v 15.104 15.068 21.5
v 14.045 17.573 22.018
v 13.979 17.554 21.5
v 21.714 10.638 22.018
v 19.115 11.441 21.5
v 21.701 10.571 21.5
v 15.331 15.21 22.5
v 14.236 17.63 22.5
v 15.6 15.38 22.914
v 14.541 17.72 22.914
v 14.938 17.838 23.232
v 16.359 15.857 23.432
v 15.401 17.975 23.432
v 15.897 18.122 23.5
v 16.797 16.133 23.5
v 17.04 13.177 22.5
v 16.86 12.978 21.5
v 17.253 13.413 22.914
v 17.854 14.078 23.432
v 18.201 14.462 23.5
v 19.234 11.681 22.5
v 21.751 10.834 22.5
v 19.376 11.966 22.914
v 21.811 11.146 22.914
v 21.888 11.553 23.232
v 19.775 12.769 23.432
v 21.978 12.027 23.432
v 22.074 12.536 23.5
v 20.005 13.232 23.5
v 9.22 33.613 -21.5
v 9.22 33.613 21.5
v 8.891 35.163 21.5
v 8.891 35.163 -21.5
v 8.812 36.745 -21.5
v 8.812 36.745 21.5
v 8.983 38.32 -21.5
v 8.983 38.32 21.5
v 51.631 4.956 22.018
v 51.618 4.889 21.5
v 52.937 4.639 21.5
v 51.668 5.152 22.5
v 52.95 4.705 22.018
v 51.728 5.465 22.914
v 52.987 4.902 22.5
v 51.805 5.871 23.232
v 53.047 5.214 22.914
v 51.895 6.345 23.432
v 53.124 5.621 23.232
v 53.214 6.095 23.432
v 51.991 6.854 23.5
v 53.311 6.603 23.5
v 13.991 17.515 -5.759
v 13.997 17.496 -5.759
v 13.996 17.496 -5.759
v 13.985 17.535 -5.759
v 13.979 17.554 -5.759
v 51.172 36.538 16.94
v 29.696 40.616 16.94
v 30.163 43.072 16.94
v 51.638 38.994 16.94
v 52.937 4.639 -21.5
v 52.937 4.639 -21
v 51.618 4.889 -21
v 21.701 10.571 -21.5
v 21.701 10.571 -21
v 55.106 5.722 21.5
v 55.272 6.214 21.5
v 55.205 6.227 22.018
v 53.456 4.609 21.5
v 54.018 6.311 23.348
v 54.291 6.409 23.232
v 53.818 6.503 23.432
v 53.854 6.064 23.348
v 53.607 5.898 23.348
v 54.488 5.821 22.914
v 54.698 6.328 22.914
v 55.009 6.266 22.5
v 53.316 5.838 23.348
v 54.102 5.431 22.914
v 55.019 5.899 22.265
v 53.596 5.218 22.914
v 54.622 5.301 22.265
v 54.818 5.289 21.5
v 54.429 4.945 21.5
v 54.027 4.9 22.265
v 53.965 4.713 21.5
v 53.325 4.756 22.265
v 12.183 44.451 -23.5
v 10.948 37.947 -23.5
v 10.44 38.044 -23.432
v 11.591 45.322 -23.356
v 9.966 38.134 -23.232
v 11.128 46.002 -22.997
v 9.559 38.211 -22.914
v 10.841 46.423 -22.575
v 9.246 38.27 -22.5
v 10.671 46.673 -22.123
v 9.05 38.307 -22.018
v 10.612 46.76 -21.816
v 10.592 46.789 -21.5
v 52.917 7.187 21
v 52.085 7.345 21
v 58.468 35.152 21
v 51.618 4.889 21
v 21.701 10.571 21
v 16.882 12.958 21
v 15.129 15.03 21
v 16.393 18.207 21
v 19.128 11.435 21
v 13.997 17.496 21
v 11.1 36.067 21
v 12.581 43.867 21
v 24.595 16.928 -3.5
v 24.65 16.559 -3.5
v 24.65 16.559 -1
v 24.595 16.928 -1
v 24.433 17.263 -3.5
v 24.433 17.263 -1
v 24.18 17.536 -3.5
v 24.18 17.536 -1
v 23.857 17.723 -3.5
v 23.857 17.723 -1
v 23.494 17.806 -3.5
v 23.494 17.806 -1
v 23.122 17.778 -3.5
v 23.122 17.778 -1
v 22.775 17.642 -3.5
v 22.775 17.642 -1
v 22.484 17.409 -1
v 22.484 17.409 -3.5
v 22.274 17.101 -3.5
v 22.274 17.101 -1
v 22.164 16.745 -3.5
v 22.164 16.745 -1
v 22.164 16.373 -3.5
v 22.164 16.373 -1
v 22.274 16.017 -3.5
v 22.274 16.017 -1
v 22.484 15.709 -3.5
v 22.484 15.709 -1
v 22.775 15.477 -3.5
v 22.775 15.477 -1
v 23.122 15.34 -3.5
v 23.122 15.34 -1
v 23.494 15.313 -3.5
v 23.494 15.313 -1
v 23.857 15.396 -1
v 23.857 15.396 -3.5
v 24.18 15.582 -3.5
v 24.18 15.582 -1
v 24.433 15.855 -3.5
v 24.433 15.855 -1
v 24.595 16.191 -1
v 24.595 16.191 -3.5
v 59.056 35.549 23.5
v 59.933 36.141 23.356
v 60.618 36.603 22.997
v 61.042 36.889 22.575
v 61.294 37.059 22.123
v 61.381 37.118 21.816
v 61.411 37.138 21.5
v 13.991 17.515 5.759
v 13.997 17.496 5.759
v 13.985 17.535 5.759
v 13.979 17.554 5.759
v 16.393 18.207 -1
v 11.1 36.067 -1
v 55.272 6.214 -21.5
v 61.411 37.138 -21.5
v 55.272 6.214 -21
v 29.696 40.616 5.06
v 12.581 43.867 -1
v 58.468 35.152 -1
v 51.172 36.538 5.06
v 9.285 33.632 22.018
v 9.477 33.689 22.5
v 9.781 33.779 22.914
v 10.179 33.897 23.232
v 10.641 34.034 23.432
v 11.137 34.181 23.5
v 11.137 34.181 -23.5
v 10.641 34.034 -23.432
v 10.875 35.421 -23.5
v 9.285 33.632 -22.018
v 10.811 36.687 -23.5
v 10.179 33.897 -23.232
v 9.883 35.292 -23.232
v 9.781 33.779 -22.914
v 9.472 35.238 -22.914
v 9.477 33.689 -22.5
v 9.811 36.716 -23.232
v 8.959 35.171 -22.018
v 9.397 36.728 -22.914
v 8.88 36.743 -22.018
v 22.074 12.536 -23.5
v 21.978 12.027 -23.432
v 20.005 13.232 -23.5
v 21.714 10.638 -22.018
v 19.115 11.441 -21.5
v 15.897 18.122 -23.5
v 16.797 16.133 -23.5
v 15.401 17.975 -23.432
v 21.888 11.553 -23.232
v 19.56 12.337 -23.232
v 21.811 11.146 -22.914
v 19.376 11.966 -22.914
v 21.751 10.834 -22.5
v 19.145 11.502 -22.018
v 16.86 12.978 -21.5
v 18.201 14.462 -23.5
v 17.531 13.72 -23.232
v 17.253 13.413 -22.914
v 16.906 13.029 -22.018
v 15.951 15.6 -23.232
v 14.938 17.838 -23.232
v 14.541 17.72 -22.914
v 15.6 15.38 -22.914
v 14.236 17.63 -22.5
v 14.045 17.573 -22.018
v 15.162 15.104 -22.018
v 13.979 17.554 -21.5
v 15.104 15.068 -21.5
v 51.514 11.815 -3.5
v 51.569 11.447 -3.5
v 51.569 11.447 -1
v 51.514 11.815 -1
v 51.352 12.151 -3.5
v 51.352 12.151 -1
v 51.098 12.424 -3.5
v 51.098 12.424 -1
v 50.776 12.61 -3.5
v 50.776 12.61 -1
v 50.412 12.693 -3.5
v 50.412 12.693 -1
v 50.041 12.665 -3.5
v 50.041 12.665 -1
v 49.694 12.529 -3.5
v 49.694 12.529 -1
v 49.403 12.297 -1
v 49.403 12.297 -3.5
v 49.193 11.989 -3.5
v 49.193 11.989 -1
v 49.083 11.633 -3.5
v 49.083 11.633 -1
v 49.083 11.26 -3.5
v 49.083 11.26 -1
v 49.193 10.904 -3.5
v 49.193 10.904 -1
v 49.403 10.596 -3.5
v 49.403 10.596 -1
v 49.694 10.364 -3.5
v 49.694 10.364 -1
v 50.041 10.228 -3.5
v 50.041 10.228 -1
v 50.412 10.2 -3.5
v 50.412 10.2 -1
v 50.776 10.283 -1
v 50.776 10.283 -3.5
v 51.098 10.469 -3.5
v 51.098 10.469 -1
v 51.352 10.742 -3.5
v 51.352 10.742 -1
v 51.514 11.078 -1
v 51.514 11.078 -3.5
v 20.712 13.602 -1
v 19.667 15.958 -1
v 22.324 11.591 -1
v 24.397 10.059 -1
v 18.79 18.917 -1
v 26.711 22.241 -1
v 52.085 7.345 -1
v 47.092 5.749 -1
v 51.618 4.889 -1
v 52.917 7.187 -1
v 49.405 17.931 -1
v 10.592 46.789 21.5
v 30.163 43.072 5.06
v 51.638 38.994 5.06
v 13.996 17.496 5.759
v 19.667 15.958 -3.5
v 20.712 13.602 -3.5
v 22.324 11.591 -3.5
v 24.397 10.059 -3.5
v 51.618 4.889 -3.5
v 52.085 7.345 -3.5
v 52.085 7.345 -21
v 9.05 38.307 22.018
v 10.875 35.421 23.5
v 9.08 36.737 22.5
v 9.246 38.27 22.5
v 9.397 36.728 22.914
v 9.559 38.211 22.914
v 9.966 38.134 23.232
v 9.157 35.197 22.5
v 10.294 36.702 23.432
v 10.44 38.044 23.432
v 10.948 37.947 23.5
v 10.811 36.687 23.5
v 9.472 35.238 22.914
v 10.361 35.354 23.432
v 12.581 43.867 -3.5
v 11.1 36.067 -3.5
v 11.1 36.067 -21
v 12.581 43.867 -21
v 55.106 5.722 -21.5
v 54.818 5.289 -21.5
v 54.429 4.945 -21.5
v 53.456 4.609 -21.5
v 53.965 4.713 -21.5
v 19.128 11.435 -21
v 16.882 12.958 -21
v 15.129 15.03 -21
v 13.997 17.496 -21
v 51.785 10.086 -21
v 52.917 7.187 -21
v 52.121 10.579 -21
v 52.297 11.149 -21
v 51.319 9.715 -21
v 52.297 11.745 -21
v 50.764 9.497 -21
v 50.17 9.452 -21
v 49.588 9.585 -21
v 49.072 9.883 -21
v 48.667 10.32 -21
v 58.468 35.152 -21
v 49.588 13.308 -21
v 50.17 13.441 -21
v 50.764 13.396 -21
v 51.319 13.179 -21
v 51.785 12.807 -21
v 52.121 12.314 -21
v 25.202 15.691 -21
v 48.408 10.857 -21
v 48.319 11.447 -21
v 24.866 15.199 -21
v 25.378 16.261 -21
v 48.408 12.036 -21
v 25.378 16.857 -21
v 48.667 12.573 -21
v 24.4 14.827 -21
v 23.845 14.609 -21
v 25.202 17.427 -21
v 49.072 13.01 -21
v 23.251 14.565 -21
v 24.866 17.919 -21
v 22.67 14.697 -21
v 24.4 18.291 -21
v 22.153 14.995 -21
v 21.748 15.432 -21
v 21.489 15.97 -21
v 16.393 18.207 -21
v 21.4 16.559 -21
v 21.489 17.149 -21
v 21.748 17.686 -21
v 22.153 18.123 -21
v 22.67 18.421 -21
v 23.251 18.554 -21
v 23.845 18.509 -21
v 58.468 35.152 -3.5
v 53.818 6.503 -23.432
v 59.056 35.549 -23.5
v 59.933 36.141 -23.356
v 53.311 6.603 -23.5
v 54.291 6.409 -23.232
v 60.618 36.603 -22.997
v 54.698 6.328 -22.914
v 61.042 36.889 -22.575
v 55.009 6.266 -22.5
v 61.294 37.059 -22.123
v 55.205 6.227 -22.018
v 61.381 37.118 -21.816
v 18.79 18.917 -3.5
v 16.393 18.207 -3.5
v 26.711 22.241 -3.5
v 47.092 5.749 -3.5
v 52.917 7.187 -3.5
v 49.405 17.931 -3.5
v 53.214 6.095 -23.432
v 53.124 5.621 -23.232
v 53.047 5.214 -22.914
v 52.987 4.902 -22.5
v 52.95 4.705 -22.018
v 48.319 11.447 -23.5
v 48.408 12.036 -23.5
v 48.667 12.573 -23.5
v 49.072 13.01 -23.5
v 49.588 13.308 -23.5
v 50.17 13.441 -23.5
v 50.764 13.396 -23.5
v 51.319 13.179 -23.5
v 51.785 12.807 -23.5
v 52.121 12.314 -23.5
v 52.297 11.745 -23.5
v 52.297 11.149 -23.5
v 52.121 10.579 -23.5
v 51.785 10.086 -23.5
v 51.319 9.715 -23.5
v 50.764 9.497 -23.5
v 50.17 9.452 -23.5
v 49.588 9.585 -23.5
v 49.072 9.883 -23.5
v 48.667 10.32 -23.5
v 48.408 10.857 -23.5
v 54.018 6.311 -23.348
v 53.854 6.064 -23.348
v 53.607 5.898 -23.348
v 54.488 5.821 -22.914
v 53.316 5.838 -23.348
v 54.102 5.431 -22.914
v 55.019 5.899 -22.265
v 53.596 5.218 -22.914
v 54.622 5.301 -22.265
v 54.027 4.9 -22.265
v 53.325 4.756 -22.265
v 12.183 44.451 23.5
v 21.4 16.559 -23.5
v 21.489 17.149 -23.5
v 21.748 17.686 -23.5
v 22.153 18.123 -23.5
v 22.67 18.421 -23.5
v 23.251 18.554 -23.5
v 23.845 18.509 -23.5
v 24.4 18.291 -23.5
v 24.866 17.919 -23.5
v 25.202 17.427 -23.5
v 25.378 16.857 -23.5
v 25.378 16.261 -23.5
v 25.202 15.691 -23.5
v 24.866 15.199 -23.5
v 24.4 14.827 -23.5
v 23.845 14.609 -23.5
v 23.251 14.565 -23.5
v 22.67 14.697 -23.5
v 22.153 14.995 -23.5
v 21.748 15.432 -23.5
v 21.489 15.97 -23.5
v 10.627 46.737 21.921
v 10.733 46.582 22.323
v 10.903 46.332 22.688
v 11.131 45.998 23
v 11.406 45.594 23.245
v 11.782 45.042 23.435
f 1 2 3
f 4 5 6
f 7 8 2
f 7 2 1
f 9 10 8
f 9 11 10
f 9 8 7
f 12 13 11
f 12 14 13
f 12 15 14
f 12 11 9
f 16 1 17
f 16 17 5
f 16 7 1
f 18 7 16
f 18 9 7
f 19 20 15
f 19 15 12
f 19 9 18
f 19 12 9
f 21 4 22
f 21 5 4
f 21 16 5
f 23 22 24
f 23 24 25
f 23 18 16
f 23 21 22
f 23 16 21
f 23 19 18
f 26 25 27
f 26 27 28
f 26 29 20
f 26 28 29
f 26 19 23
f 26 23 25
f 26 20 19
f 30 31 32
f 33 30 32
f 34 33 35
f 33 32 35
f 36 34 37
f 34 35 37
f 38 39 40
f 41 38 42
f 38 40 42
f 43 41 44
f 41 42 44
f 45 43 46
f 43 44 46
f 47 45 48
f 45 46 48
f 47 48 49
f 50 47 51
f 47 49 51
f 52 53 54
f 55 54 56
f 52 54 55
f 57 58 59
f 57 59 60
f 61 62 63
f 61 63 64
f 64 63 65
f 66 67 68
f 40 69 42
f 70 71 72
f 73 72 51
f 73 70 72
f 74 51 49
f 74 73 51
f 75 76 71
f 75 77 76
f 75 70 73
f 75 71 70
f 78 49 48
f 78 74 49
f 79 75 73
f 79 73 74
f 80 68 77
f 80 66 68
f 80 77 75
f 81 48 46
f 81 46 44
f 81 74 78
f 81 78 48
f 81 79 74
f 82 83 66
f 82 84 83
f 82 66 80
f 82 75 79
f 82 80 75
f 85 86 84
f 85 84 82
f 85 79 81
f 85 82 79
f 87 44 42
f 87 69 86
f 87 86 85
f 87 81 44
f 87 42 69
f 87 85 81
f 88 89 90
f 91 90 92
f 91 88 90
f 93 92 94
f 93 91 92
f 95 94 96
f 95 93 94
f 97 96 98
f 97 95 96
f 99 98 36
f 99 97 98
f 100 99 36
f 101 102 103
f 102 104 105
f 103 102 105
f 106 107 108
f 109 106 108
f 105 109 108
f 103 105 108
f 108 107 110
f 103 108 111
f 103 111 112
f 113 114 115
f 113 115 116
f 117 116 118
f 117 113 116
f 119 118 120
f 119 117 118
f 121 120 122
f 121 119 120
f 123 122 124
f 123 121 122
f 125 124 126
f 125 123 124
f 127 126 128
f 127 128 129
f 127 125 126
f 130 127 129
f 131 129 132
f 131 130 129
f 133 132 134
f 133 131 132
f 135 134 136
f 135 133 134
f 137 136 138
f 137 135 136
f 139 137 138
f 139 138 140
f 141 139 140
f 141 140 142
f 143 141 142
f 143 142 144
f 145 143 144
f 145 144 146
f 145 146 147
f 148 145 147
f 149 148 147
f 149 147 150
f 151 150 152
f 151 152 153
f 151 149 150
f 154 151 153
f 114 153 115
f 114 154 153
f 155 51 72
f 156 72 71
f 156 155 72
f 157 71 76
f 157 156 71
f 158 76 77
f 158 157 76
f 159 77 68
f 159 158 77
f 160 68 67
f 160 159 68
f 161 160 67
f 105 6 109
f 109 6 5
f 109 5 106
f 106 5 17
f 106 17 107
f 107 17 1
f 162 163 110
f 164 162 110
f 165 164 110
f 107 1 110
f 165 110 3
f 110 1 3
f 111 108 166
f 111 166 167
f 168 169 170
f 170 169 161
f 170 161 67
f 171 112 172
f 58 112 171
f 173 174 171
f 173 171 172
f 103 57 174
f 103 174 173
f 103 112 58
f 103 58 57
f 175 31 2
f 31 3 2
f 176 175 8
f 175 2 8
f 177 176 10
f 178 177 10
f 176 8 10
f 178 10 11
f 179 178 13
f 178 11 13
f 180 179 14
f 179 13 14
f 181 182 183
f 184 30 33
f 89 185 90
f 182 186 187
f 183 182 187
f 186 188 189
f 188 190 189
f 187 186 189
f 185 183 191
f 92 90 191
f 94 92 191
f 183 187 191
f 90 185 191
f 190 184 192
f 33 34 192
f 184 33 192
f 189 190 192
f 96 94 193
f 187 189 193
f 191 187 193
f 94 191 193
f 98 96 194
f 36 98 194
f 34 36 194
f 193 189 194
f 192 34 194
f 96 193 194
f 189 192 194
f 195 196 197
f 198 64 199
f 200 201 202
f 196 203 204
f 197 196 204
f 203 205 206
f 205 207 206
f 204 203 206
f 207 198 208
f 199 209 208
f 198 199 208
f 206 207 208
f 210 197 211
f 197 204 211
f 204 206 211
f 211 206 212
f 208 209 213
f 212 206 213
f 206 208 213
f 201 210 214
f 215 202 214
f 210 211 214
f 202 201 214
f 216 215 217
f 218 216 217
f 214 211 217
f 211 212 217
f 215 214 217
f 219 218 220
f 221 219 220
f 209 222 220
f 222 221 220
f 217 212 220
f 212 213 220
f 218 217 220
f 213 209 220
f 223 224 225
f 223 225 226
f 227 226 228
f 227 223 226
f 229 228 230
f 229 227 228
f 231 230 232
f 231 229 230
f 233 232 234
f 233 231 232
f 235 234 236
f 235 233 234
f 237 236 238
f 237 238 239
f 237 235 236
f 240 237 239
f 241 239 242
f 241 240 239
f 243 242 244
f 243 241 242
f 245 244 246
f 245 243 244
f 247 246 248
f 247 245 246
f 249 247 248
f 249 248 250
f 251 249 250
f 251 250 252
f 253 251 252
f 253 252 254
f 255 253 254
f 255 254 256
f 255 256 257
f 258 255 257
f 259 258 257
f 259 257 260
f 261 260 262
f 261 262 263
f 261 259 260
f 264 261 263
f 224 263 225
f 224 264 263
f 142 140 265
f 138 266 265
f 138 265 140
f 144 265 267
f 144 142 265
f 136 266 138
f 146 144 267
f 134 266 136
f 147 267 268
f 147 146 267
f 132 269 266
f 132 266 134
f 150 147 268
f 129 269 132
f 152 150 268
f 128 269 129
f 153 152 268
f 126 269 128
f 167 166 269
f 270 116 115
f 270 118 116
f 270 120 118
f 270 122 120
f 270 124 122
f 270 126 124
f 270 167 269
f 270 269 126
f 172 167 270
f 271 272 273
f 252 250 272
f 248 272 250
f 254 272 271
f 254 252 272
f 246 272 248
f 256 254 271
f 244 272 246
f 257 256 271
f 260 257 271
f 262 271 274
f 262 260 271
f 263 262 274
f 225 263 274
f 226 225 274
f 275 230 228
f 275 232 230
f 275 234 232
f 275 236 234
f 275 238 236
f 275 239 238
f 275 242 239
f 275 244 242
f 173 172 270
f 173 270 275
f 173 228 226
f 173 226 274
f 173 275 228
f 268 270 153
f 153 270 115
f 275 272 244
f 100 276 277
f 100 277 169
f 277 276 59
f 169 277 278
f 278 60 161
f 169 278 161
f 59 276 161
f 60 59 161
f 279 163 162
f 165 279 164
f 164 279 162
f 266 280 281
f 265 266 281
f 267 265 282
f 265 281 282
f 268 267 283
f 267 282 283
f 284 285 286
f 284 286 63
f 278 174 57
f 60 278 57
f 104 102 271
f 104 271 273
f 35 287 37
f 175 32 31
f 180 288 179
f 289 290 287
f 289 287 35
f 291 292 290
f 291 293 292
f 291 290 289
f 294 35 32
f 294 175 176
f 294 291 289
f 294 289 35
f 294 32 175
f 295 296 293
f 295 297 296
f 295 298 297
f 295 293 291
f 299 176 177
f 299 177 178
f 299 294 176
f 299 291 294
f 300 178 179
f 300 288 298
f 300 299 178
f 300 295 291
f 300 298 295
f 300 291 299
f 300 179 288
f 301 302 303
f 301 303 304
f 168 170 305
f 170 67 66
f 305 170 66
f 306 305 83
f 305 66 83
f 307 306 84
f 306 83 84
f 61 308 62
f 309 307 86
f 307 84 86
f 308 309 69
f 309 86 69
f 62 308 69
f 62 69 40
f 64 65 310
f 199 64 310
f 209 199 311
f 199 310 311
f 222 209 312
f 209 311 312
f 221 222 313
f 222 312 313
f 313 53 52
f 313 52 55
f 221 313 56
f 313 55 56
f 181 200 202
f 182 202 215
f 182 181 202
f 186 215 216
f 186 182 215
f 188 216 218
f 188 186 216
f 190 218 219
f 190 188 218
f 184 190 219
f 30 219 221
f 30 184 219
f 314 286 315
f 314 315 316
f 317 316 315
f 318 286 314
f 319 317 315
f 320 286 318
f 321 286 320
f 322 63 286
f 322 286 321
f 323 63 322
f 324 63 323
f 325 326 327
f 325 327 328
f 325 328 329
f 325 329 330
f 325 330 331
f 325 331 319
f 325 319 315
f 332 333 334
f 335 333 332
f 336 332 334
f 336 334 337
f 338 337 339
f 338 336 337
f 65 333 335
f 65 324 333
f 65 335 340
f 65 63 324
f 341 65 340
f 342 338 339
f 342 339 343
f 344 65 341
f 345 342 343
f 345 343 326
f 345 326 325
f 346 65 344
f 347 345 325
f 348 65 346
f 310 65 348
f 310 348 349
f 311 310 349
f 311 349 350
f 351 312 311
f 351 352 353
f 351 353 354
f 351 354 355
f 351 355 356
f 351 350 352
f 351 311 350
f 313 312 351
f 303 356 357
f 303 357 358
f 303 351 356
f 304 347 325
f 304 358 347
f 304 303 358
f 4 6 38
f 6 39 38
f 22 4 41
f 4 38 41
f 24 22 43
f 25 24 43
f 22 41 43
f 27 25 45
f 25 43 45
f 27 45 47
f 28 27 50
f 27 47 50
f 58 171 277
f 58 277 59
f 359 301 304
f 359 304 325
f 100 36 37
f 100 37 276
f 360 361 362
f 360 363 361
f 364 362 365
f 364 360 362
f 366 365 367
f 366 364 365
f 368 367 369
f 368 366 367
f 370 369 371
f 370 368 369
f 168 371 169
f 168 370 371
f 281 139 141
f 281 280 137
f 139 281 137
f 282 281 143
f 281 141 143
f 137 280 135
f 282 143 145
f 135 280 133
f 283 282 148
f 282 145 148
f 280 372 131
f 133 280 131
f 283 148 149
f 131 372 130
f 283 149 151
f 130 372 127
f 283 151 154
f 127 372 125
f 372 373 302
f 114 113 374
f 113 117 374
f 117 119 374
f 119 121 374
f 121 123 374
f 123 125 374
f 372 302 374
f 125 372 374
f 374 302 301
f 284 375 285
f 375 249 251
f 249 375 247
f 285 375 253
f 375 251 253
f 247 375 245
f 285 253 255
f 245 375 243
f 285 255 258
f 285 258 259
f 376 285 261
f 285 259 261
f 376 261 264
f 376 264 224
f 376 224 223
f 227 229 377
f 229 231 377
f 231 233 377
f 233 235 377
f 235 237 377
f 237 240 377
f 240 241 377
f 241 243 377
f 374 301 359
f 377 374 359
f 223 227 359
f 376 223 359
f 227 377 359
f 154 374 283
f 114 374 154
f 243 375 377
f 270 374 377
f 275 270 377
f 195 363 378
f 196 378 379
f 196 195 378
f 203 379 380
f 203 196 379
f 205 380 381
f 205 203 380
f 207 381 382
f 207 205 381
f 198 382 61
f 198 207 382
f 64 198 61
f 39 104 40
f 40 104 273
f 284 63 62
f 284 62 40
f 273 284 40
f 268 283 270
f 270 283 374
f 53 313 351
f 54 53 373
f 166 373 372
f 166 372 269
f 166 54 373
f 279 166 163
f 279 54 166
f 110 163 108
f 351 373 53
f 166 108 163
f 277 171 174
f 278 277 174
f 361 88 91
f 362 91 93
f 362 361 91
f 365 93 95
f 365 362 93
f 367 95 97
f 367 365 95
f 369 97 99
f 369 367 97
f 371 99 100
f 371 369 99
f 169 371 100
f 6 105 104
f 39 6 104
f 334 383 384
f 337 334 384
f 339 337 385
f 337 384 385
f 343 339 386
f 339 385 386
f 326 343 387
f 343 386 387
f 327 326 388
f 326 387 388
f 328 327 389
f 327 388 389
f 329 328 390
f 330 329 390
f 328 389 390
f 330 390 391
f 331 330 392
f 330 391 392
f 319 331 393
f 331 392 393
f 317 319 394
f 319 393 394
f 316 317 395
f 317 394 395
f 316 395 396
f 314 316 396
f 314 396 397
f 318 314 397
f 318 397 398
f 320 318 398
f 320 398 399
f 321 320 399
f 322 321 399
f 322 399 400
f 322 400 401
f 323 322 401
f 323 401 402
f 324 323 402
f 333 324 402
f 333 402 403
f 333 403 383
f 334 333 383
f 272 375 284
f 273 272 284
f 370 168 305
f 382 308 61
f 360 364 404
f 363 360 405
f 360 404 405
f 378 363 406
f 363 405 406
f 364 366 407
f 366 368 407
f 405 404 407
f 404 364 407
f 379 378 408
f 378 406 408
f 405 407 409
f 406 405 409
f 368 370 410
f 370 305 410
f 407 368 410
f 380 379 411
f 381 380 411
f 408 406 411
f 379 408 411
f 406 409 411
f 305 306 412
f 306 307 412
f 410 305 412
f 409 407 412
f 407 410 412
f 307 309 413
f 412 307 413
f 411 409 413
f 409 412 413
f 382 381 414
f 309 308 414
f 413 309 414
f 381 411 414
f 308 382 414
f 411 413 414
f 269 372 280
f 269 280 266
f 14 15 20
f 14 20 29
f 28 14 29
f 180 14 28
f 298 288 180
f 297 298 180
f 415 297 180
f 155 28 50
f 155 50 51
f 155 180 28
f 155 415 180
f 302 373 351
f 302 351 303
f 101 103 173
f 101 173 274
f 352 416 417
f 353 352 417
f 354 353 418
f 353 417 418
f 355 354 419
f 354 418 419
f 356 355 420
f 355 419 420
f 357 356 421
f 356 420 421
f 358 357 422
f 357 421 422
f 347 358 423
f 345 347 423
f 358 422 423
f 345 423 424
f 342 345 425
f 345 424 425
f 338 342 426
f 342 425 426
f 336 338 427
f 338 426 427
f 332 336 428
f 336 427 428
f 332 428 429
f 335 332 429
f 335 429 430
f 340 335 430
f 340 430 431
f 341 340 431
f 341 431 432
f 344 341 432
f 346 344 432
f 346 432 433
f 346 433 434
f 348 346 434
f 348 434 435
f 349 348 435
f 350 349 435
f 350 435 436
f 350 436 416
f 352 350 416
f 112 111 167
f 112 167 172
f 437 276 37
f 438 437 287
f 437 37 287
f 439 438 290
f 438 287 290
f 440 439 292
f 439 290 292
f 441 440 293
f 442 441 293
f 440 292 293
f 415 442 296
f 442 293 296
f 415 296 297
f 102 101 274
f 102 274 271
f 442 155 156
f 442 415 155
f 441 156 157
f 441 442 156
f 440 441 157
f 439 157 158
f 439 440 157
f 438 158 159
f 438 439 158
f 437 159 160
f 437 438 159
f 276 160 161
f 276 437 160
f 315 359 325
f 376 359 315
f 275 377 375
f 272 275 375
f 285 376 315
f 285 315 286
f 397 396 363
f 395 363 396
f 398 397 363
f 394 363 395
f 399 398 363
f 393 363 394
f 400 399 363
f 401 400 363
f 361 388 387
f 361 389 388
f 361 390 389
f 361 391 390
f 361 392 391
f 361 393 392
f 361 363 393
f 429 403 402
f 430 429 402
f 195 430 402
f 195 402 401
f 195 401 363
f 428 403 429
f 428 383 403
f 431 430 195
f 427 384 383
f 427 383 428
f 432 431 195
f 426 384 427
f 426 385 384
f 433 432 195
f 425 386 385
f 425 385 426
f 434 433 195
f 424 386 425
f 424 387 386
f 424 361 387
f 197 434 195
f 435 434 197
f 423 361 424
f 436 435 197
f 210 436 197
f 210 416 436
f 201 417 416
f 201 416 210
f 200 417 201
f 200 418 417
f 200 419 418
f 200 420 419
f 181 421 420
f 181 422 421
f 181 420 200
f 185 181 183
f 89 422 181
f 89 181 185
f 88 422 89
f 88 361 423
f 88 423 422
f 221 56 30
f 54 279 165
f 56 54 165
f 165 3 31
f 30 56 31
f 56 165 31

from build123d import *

# Parameters (mm, degrees)
EXTRUDE_3_DEPTH     = 21
EXTRUDE_1_DEPTH     = 2.5
SKETCH_9_R          = 1.25
EXTRUDE_2_DEPTH     = 2.5
EXTRUDE_3_2_DEPTH   = 2.5
SKETCH_11_W         = 42
SKETCH_11_H         = 10.406253358
CUT_EXTRUDE_1_DEPTH = 5
FILLET_1_R          = 10
FILLET_2_R          = 2
SKETCH_12_W         = 21.859303669
SKETCH_12_H         = 11.880056341
CUT_EXTRUDE_2_DEPTH = 61
SKETCH_14_R         = 2
CUT_EXTRUDE_3_DEPTH = 10


with BuildPart() as part:
    # 草图7 → Extrude 3 (new, symmetric)
    with BuildSketch(Plane.XY):
        Polygon((51.618317891, 4.889024384), (54.886055332, 4.268404852), (61.410827986, 37.137721863), (10.591755085, 46.789448736), (8.530755399, 35.937702238), (15.711697443, 11.708528829), (19.787318129, 10.93447343), (20.253787963, 13.390569091), (17.675542885, 13.880237947), (11.09997038, 36.066837632), (12.581380912, 43.866883241), (58.467863291, 35.15197032), (52.916660674, 7.187127975), (52.084787725, 7.345120045), align=None)
    extrude(amount=EXTRUDE_3_DEPTH, both=True)

    # 草图8 → 凸台-拉伸1 (add)
    with BuildSketch(Plane.XY.offset(21)):
        Polygon((58.467863291, 35.15197032), (52.916660674, 7.187127975), (52.084787725, 7.345120045), (51.618317891, 4.889024384), (54.886055332, 4.268404852), (61.410827986, 37.137721863), (10.591755085, 46.789448736), (8.530755399, 35.937702238), (15.711697443, 11.708528829), (19.787318129, 10.93447343), (20.253787963, 13.390569091), (17.675542885, 13.880237947), (11.09997038, 36.066837632), (12.581380912, 43.866883241), align=None)
        Polygon((19.787318129, 10.93447343), (51.618317891, 4.889024384), (52.084787725, 7.345120045), (52.916660674, 7.187127975), (58.467863291, 35.15197032), (12.581380912, 43.866883241), (11.09997038, 36.066837632), (17.675542885, 13.880237947), (20.253787963, 13.390569091), align=None)
    extrude(amount=EXTRUDE_1_DEPTH)

    # 草图9 → 凸台-拉伸2 (add)
    with BuildSketch(Plane.XY.offset(-3.5)):
        Polygon((24.397237371, 10.058942279), (26.710927747, 22.241176755), (49.405425881, 17.930962401), (47.091735505, 5.748727924), (54.886055332, 4.268404852), (61.410827986, 37.137721863), (10.591755085, 46.789448736), (8.530755399, 35.937702238), (15.711697443, 11.708528829), align=None)
        with Locations((23.400258978, 16.559120835)):
            Circle(SKETCH_9_R, mode=Mode.SUBTRACT)
        with Locations((50.319067418, 11.446611456)):
            Circle(SKETCH_9_R, mode=Mode.SUBTRACT)
    extrude(amount=EXTRUDE_2_DEPTH)

    # 草图10 → Extrude 3 2 (add)
    with BuildSketch(Plane(origin=(0, 0, -21), x_dir=(-1, 0, 0), z_dir=(0, 0, -1))):
        Polygon((-15.711697443, 11.708528829), (-8.530755399, 35.937702238), (-10.591755085, 46.789448736), (-61.410827986, 37.137721863), (-54.886055332, 4.268404852), align=None)
    extrude(amount=EXTRUDE_3_2_DEPTH)

    # 草图11 → 切除-拉伸1 (cut)
    with BuildSketch(Plane(origin=(17.63296674, 5.225985637, 0), x_dir=(0, 0, 1), z_dir=(-0.9587773323568242, -0.28415845396315786, 0))):
        with Locations((0, 7.59472781)):
            Rectangle(SKETCH_11_W, SKETCH_11_H)
    extrude(amount=-CUT_EXTRUDE_1_DEPTH, mode=Mode.SUBTRACT)

    # 圆角1
    # the kernel refuses this fillet: 10 mm, written as the material it takes off along each edge
    with BuildSketch(Plane(origin=(15.711697443, 11.708528829, -5.758578091), x_dir=(0.9824382642502659, -0.18658793352445072, 0), z_dir=(0, 0, -1)), Plane(origin=(15.711697443, 11.708528829, 38.741421909), x_dir=(0.9824382642502659, -0.18658793352445072, 0), z_dir=(0, 0, -1))) as fillet_1_piece_1:
        with BuildLine():
            CenterArc((FILLET_1_R * 0.609656876359, -FILLET_1_R), FILLET_1_R, 90, 62.737721614)
            Line((-FILLET_1_R * 0.279262123126, -FILLET_1_R * 0.541935580562), (0, 0))
            Line((0, 0), (FILLET_1_R * 0.609656876359, 0))
        make_face()
    extrude(amount=32.982843818, mode=Mode.SUBTRACT)
    with BuildSketch(Plane(origin=(21.237725488, 10.659007254, -17.317640641), x_dir=(0.9824382642502885, -0.18658793352433115, 0), z_dir=(0, 0, 1))) as fillet_1_piece_2:
        with BuildLine():
            CenterArc((6.357442179, 9.493749512), FILLET_1_R, 207.262278386, 44.428504043)
            Line((-2.531747815, 4.913105318), (0, 0))
            Line((0, 0), (3.215990254, 0))
        make_face()
    extrude(amount=30.135281283, mode=Mode.SUBTRACT)
    with BuildSketch(Plane(origin=(8.530755399, 35.937702238, 29.562520674), x_dir=(0.18658793352445296, 0.9824382642502654, 0), z_dir=(0, 0, -1))) as fillet_1_piece_3:
        with BuildLine():
            CenterArc((FILLET_1_R * 0.242500826961, FILLET_1_R), FILLET_1_R, 242.737721614, 27.262278386)
            Line((-FILLET_1_R * 0.215563592477, FILLET_1_R * 0.111081000515), (0, 0))
            Line((0, 0), (FILLET_1_R * 0.242500826961, 0))
        make_face()
    extrude(amount=59.125041348, mode=Mode.SUBTRACT)

    # 圆角2
    fillet_2_edges = [part.edges().sort_by_distance(p)[0] for p in [
        (36.001291535, 41.963585299, -23.5),
        (58.148441659, 20.703063357, -23.5),
        (38.293627604, 7.419693757, -23.5),
        (11.599573944, 25.583220021, 23.5),
        (11.599573944, 25.583220021, -23.5),
        (9.787493883, 42.554785944, -23.5),
        (16.859888508, 12.978250443, -23.5),
        (8.820223079, 35.952251632, -23.5),
        (38.293627604, 7.419693757, 23.5),
        (16.859888508, 12.978250443, 23.5),
        (8.820223079, 35.952251632, 23.5),
        (54.886055332, 4.268404852, 0),
        (58.148441659, 20.703063357, 23.5),
        (36.001291535, 41.963585299, 23.5),
        (9.787493883, 42.554785944, 23.5),
    ]]
    fillet(fillet_2_edges, radius=FILLET_2_R)

    # 草图12 → 切除-拉伸2 (cut)
    with BuildSketch(Plane(origin=(8.479309234, 44.645962299, 0), x_dir=(0.9824382642502656, -0.18658793352445194, 0), z_dir=(-0.18658793352445194, -0.9824382642502656, 0))):
        with Locations((32.525954901, 11.00026169)):
            Rectangle(SKETCH_12_W, SKETCH_12_H)
    extrude(amount=-CUT_EXTRUDE_2_DEPTH, mode=Mode.SUBTRACT)

    # 草图14 → 切除-拉伸3 (cut)
    with BuildSketch(Plane(origin=(0, 0, -23.5), x_dir=(-1, 0, 0), z_dir=(0, 0, -1))):
        with Locations((-50.319067418, 11.446611456)):
            Circle(SKETCH_14_R)
        with Locations((-23.400258978, 16.559120835)):
            Circle(SKETCH_14_R)
    extrude(amount=-CUT_EXTRUDE_3_DEPTH, mode=Mode.SUBTRACT)


solid = part.part
